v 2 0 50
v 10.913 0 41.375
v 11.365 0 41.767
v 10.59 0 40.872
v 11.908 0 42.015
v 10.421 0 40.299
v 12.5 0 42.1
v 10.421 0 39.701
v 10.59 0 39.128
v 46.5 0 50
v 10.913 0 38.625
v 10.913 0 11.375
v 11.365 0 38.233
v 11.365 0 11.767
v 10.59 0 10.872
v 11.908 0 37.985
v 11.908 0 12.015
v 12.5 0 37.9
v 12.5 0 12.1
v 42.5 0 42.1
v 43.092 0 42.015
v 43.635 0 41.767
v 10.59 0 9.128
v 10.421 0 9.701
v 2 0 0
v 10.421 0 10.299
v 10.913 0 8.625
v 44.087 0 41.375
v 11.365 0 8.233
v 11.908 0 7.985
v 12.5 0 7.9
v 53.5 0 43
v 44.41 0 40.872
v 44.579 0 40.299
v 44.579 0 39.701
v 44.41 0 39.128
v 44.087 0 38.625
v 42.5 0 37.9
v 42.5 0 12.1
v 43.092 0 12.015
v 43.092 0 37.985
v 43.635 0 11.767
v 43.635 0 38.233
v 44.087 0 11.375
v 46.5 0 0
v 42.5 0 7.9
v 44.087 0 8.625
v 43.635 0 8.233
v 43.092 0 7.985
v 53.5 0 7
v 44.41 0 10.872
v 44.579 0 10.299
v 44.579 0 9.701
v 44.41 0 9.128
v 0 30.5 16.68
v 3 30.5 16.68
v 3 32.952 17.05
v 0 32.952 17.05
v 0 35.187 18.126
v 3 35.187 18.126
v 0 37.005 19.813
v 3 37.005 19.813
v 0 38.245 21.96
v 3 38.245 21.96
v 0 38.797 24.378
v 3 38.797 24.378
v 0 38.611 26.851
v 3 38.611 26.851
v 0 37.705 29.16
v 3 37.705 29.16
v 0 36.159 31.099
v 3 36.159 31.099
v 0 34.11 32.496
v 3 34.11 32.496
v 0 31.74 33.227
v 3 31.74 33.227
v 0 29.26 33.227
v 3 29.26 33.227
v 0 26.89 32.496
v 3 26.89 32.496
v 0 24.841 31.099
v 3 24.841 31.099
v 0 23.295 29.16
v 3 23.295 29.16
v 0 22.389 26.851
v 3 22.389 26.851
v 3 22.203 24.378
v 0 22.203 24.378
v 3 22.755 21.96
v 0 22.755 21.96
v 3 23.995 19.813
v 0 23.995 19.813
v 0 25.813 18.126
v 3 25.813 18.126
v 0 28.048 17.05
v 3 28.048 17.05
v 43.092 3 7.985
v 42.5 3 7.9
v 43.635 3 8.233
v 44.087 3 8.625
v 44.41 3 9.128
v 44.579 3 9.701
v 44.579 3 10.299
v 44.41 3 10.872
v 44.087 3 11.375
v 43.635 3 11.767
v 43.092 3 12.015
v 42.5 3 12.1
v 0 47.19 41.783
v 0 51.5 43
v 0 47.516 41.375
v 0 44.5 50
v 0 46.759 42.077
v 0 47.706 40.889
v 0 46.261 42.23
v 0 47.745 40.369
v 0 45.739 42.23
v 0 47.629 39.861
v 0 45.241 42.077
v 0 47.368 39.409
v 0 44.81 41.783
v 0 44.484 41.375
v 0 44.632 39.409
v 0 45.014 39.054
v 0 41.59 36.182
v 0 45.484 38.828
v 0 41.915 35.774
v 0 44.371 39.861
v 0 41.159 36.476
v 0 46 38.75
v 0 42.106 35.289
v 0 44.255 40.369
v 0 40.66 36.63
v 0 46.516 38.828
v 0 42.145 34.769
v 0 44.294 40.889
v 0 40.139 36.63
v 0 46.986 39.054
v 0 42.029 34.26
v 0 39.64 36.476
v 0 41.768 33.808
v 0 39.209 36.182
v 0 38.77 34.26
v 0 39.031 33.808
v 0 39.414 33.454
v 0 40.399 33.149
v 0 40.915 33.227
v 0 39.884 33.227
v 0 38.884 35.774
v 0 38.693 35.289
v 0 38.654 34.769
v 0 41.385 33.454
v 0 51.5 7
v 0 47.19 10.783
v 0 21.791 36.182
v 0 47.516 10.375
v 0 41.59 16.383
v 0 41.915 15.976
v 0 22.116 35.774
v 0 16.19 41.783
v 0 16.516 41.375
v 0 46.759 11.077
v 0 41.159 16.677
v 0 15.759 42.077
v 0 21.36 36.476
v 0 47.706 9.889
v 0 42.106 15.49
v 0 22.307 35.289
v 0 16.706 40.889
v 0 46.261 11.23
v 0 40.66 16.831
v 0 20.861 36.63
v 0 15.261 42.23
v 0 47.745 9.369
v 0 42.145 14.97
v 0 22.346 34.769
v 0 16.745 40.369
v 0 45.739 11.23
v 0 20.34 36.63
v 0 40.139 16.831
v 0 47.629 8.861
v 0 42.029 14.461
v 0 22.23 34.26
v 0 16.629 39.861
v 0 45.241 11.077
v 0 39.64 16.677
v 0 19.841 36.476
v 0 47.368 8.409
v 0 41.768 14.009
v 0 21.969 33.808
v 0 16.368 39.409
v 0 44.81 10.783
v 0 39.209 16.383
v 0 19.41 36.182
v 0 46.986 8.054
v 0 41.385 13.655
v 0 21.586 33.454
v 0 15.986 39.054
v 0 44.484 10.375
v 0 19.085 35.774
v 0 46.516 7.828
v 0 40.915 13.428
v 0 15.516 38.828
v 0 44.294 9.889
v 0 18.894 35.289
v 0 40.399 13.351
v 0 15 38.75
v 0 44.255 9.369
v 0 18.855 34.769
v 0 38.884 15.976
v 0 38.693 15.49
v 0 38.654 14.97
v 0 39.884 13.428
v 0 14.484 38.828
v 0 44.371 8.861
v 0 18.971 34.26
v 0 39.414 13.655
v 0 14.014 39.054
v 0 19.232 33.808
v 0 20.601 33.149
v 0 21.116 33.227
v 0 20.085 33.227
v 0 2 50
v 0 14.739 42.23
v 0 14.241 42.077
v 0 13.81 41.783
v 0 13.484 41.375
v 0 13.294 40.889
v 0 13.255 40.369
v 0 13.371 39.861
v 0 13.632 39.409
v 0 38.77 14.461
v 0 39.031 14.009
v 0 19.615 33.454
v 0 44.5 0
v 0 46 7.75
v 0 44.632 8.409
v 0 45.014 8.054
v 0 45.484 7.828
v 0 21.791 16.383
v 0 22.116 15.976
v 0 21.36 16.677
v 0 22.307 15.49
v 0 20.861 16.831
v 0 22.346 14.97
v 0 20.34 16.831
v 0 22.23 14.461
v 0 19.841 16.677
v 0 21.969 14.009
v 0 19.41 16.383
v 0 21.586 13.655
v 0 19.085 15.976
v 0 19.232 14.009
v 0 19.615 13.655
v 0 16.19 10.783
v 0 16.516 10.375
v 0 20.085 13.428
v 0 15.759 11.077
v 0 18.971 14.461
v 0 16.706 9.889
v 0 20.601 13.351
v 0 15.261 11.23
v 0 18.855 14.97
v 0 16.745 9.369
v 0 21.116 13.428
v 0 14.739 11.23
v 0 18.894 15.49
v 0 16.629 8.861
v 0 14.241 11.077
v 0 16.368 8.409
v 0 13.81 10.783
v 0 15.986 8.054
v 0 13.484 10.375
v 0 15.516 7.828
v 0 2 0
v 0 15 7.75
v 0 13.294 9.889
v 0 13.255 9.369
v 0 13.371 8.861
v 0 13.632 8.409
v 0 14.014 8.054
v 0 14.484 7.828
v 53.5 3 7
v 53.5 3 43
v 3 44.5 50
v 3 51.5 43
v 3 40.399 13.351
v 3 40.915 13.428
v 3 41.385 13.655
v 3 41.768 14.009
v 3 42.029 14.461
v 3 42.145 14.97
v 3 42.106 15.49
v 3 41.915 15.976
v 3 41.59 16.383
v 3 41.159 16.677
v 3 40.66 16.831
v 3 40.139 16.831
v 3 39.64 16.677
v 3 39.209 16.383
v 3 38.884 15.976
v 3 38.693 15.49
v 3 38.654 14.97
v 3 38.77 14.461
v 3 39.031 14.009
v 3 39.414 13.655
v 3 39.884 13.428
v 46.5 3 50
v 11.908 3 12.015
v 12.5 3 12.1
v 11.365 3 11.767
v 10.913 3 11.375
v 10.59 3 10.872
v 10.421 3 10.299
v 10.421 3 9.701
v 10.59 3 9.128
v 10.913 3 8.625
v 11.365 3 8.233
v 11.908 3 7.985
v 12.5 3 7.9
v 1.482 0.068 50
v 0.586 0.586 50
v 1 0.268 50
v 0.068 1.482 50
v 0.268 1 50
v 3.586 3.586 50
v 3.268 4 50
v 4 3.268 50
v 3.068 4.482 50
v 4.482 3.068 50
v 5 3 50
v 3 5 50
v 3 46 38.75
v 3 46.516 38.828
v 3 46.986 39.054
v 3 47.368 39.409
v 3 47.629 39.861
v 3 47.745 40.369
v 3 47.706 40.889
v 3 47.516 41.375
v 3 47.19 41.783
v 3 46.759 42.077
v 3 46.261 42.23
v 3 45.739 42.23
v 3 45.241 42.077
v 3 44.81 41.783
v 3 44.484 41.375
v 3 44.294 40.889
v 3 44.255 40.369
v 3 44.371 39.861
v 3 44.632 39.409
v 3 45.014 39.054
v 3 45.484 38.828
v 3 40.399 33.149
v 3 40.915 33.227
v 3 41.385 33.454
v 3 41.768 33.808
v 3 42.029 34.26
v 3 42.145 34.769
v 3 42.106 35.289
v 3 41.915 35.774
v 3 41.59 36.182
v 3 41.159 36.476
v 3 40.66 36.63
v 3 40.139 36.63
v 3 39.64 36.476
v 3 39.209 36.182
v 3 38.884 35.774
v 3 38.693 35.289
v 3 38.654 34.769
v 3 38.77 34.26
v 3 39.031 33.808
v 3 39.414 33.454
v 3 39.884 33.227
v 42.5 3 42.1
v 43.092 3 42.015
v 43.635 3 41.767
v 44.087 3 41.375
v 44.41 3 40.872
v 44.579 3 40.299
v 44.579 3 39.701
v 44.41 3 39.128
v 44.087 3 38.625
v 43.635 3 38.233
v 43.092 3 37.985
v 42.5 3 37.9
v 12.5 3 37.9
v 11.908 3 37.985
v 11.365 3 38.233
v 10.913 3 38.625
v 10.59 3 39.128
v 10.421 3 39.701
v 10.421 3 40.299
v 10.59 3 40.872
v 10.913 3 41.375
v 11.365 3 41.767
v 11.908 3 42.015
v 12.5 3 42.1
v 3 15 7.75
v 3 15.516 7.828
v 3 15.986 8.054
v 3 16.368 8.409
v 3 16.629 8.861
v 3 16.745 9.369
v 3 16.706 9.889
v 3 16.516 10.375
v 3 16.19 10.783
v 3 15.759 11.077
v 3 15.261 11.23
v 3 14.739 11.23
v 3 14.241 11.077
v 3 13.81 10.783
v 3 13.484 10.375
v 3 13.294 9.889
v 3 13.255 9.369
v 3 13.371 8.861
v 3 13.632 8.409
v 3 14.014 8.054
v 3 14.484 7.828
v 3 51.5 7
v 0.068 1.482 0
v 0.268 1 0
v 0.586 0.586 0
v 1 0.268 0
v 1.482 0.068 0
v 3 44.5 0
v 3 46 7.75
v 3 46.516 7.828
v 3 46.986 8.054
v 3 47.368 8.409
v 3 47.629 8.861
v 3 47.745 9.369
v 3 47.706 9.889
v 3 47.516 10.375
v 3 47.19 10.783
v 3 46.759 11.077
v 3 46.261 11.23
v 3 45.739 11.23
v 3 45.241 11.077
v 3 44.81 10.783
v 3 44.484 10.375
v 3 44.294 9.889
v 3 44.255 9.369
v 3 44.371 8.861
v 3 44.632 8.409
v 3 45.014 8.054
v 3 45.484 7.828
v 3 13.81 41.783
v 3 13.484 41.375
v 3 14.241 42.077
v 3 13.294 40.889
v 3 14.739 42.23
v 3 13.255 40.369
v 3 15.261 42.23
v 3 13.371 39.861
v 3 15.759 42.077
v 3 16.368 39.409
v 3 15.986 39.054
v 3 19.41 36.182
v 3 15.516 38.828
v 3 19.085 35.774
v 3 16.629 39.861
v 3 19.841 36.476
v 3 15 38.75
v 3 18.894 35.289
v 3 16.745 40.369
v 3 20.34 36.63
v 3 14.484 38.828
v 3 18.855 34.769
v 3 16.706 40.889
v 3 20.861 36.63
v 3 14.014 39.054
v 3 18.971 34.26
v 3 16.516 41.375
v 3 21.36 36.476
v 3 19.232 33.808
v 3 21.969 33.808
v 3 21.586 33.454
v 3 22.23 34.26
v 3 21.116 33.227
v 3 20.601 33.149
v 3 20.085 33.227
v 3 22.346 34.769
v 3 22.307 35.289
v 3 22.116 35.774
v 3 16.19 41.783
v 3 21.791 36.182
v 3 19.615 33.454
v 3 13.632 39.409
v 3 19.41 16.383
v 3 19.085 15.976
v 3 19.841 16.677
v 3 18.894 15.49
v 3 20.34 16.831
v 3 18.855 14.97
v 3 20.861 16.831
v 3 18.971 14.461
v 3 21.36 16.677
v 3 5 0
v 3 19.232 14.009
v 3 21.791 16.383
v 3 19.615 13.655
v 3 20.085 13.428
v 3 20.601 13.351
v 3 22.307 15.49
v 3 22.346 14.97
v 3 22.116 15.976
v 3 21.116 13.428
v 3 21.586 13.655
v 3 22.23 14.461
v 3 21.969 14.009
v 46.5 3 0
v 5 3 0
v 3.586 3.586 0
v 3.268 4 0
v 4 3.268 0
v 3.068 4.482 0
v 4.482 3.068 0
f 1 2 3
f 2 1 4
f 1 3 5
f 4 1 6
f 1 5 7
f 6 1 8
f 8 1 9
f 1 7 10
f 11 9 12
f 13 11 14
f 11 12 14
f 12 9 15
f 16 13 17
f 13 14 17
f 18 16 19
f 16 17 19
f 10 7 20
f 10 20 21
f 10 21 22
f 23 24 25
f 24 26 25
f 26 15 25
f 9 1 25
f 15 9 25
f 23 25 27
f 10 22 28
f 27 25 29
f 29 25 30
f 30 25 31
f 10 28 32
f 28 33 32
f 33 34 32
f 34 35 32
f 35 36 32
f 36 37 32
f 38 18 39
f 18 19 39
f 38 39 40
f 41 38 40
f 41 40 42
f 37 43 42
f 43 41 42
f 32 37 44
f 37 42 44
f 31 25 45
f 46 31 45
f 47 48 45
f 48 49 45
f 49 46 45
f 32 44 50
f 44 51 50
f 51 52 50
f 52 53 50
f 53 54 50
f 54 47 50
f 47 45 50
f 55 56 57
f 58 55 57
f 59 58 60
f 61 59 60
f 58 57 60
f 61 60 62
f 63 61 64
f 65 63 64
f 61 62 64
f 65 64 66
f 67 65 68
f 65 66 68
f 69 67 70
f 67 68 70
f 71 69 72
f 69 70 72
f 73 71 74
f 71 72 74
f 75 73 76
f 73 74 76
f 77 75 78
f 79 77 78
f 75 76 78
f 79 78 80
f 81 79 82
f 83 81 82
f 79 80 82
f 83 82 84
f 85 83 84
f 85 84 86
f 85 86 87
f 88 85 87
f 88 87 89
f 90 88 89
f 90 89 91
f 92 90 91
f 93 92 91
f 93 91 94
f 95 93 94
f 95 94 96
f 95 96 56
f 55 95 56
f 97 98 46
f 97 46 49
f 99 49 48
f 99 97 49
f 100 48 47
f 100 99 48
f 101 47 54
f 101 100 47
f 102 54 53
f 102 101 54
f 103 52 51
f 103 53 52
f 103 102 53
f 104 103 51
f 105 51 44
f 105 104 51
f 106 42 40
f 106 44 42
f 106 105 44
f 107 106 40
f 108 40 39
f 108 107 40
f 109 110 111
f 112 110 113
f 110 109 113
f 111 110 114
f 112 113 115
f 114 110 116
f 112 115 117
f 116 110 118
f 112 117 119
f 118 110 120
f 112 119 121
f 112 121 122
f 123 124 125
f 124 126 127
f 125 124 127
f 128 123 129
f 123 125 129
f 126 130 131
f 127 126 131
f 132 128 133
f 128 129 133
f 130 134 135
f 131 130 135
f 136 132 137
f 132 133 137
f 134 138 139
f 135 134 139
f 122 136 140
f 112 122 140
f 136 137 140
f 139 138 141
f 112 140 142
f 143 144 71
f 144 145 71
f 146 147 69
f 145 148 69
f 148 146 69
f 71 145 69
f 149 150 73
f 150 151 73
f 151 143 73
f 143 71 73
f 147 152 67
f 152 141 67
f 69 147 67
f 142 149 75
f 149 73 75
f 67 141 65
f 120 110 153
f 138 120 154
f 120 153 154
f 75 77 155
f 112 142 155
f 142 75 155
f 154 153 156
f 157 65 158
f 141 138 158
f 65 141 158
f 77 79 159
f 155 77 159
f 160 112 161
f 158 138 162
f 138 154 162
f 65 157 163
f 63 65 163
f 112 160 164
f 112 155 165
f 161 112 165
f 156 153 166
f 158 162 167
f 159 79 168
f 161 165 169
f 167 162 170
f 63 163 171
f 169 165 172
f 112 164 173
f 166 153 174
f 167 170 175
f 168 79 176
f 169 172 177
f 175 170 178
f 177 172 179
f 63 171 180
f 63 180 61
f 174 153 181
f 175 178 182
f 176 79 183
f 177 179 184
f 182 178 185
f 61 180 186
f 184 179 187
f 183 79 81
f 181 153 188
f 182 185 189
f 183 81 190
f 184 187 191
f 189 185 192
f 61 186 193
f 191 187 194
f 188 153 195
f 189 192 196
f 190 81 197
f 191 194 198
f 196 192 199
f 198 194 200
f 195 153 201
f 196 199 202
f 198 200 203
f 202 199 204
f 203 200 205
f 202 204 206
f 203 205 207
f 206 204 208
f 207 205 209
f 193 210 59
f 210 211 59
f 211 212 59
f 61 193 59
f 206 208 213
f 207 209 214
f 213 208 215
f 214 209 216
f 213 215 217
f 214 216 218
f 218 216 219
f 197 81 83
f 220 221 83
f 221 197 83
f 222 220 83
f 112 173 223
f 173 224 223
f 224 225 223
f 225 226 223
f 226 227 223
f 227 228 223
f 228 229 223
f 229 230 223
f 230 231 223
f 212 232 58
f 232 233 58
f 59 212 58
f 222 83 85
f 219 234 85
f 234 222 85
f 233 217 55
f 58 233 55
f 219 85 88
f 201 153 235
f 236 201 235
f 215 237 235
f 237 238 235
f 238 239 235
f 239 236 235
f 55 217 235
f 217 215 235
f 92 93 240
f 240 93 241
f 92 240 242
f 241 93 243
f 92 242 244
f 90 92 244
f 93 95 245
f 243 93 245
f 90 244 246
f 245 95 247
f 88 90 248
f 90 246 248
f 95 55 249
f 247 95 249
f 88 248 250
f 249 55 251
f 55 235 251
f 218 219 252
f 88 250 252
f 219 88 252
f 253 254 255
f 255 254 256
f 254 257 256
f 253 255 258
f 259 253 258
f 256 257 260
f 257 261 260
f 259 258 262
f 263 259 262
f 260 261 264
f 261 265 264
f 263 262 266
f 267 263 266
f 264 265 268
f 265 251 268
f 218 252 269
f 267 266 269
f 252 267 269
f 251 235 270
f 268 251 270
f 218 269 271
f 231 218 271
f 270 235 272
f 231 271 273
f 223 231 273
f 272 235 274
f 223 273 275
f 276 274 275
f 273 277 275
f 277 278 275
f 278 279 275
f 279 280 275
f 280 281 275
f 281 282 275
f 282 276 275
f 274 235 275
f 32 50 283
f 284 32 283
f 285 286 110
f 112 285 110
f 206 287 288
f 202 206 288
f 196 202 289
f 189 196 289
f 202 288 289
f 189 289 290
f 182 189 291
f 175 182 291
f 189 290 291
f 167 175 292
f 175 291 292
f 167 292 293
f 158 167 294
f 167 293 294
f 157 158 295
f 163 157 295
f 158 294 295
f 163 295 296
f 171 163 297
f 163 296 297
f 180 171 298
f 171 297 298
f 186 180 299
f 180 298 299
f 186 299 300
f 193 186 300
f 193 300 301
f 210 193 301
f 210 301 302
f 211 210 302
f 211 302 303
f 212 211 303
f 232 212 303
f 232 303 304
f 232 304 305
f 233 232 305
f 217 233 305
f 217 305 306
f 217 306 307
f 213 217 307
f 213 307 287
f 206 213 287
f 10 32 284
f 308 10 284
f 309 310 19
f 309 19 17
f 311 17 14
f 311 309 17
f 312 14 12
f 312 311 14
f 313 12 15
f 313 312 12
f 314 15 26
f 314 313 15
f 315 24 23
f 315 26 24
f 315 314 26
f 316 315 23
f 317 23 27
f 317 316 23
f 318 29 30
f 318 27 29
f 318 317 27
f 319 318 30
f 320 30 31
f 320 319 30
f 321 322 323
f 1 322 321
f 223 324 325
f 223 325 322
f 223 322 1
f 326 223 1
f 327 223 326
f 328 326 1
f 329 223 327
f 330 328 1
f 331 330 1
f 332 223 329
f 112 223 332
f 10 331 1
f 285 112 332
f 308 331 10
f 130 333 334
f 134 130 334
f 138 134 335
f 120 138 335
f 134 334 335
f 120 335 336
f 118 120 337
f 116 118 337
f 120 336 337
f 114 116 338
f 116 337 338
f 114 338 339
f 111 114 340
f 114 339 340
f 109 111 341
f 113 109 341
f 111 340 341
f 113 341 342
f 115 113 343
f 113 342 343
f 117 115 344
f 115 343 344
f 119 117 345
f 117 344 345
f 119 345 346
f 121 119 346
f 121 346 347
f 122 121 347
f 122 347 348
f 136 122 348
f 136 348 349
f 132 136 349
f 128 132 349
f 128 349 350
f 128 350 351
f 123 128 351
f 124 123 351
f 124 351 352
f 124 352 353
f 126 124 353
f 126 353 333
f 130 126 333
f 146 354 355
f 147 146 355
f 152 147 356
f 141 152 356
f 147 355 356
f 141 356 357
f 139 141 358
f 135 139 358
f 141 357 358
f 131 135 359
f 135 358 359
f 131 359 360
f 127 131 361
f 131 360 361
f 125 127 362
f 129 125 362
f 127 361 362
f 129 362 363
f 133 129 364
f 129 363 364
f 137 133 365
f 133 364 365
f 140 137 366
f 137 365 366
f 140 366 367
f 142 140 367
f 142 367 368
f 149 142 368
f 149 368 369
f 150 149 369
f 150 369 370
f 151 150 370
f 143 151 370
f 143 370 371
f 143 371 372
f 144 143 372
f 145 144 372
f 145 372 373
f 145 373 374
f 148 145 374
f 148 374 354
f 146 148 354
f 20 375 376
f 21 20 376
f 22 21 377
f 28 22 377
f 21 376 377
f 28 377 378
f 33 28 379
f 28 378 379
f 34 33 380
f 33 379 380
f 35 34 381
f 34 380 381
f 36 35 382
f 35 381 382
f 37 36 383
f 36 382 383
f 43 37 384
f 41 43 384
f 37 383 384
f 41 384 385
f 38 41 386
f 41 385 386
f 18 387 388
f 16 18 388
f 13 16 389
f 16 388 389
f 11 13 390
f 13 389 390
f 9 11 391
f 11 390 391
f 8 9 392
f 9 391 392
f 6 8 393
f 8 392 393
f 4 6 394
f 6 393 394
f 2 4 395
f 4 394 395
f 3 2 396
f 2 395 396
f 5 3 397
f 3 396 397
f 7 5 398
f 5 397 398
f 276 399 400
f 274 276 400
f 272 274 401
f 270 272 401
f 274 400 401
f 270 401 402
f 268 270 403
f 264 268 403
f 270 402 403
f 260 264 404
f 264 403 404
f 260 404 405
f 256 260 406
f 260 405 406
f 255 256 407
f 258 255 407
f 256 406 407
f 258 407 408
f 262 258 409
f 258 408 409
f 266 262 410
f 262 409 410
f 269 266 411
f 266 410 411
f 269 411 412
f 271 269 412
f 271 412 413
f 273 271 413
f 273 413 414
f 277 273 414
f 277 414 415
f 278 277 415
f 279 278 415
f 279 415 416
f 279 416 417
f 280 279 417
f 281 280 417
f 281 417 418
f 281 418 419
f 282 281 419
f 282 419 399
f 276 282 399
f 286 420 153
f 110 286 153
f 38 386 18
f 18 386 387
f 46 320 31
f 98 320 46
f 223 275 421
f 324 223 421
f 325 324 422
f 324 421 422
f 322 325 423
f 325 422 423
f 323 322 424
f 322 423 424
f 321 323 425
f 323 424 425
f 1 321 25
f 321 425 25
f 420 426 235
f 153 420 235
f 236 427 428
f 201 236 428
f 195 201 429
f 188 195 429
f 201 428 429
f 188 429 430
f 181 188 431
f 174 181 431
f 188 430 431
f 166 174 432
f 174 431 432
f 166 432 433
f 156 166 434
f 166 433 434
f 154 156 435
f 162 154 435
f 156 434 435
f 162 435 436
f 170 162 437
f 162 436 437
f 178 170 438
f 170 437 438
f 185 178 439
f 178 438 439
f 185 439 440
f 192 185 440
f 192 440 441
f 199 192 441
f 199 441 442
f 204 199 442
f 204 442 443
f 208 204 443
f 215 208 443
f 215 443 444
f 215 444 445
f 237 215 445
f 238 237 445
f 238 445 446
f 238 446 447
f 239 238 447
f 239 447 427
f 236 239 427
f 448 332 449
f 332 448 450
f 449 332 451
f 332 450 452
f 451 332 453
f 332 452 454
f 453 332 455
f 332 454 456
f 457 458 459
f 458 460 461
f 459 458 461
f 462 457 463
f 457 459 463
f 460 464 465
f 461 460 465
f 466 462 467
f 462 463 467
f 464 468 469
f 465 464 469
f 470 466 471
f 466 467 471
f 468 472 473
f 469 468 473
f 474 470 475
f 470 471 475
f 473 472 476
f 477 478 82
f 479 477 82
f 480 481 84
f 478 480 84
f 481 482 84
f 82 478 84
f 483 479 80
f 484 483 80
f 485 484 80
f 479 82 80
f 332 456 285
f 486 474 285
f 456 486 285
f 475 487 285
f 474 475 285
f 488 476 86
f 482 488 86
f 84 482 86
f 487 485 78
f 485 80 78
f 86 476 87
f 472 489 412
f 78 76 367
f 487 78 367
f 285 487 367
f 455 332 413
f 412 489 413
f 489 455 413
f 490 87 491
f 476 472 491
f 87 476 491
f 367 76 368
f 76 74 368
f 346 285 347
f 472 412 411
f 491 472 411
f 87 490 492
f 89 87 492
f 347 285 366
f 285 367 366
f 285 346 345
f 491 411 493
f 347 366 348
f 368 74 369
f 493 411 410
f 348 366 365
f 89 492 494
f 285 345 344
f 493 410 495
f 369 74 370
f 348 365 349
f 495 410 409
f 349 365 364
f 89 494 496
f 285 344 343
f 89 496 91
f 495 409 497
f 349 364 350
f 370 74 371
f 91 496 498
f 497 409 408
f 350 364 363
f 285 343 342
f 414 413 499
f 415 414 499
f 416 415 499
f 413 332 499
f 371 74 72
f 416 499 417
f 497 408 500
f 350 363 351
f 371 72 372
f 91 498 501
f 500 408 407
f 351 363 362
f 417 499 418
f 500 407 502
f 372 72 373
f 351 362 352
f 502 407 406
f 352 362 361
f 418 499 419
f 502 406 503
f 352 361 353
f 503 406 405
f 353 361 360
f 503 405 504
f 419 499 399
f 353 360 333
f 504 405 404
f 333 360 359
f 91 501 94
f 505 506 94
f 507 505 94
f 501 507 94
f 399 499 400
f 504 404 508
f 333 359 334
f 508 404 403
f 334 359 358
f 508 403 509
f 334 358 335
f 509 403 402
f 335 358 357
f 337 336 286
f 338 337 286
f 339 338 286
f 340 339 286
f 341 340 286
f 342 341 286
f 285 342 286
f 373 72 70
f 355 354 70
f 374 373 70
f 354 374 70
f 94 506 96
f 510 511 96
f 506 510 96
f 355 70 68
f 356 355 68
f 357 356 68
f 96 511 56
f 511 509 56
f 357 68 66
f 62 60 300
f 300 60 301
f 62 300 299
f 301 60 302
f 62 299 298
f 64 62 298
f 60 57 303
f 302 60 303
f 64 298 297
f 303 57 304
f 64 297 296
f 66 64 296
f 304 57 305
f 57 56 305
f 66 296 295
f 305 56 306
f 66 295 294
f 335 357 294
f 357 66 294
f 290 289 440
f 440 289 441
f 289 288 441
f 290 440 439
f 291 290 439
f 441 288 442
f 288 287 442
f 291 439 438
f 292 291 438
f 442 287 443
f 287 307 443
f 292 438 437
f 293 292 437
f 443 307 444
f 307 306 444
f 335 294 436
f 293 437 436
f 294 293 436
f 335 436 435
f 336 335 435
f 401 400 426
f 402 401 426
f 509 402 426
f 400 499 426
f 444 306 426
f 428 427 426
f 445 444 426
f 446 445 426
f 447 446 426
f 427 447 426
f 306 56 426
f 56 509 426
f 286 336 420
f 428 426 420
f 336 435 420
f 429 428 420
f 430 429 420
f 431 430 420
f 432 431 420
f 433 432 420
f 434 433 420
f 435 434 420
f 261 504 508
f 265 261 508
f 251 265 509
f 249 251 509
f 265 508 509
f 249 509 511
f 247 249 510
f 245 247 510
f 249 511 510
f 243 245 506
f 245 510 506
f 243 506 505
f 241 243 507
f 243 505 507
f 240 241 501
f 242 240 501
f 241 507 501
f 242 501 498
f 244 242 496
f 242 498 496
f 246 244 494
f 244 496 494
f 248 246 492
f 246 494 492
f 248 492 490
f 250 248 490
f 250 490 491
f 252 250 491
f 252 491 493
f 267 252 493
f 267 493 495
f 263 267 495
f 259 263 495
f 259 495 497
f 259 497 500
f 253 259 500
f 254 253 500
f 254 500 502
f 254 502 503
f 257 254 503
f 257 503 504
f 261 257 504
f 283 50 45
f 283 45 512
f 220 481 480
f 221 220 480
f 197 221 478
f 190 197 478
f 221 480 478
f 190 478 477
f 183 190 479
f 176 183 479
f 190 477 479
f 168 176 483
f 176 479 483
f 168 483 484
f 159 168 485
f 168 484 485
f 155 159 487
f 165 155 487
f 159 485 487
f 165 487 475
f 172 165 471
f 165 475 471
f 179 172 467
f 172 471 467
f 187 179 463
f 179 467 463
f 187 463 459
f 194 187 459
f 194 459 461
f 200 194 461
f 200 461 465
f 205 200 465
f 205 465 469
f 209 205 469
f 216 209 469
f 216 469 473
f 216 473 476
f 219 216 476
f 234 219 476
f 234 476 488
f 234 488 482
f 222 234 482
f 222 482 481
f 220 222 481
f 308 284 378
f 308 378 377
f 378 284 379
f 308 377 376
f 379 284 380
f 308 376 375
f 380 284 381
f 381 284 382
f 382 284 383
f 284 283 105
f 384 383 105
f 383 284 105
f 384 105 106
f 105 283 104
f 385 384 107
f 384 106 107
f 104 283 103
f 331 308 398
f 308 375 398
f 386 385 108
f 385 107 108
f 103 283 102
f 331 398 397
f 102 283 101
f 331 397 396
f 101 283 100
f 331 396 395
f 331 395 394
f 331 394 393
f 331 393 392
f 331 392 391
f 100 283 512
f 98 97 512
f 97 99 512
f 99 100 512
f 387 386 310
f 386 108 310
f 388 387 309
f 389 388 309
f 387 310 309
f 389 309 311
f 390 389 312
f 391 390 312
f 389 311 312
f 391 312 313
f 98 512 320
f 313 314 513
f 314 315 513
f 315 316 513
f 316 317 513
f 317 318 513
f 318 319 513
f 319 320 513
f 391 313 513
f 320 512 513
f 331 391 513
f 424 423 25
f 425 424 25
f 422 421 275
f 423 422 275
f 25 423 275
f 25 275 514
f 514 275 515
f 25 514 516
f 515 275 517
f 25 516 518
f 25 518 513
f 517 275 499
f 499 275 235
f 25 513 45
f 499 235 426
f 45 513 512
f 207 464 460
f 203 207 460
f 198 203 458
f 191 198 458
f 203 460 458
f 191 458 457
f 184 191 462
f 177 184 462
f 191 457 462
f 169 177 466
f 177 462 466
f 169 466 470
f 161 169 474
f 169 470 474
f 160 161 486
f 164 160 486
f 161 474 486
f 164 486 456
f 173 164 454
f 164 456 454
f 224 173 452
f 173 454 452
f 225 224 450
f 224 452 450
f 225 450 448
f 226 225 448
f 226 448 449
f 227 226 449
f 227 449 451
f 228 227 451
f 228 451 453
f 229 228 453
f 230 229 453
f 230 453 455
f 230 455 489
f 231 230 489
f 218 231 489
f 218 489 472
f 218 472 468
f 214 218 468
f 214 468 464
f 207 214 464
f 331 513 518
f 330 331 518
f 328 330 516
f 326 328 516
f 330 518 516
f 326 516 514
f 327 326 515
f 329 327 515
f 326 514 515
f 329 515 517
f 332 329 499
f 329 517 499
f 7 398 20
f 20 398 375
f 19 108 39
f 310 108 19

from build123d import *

# Parameters (mm, degrees)
BOSS_EXTRUDE1_DEPTH = 50
SKETCH2_R           = 8.320074994
SKETCH2_R_2         = 1.75
CUT_EXTRUDE1_DEPTH  = 4
CHAMFER1_SIZE       = 7
CHAMFER2_SIZE       = 7
CUT_EXTRUDE2_DEPTH  = 50


with BuildPart() as part:
    # Sketch1 → Boss-Extrude1 (new body)
    with BuildSketch(Plane.XY):
        with BuildLine():
            Line((0, 51.5), (0, 2))
            ThreePointArc((0, 2), (0.585786438, 0.585786438), (2, 0))
            Line((2, 0), (53.5, 0))
            Line((53.5, 0), (53.5, 3))
            Line((53.5, 3), (5, 3))
            ThreePointArc((5, 3), (3.585786438, 3.585786438), (3, 5))
            Line((3, 5), (3, 51.5))
            Line((3, 51.5), (0, 51.5))
        make_face()
    extrude(amount=BOSS_EXTRUDE1_DEPTH)

    # Sketch2 → Cut-Extrude1 (cut, through all)
    with BuildSketch(Plane(origin=(3, 0, 0), x_dir=(0, 0, -1), z_dir=(1, 0, 0))):
        with Locations((-25, 30.5)):
            Circle(SKETCH2_R)
        with Locations((-34.899494937, 40.399494937)):
            Circle(SKETCH2_R_2)
        with Locations((-15.100505063, 40.399494937)):
            Circle(SKETCH2_R_2)
        with Locations((-15.100505063, 20.600505063)):
            Circle(SKETCH2_R_2)
        with Locations((-34.899494937, 20.600505063)):
            Circle(SKETCH2_R_2)
        with Locations((-40.5, 46)):
            Circle(SKETCH2_R_2)
        with Locations((-9.5, 46)):
            Circle(SKETCH2_R_2)
        with Locations((-40.5, 15)):
            Circle(SKETCH2_R_2)
        with Locations((-9.5, 15)):
            Circle(SKETCH2_R_2)
    extrude(amount=-CUT_EXTRUDE1_DEPTH, mode=Mode.SUBTRACT)

    # Chamfer1
    chamfer1_edges = [part.edges().sort_by_distance(p)[0] for p in [
        (1.5, 51.5, 0),
    ]]
    chamfer(chamfer1_edges, length=CHAMFER1_SIZE)

    # Chamfer2
    chamfer2_edges = [part.edges().sort_by_distance(p)[0] for p in [
        (53.5, 1.5, 50),
        (1.5, 51.5, 50),
        (53.5, 1.5, 0),
    ]]
    chamfer(chamfer2_edges, length=CHAMFER2_SIZE)

    # Sketch5 → Cut-Extrude2 (cut)
    with BuildSketch(Plane(origin=(0, 3, 0), x_dir=(1, 0, 0), z_dir=(0, 1, 0))):
        with BuildLine():
            Line((12.5, -7.9), (42.5, -7.9))
            ThreePointArc((42.5, -7.9), (44.6, -10), (42.5, -12.1))
            Line((42.5, -12.1), (12.5, -12.1))
            ThreePointArc((12.5, -12.1), (10.4, -10), (12.5, -7.9))
        make_face()
        with BuildLine():
            Line((12.5, -42.1), (42.5, -42.1))
            ThreePointArc((42.5, -42.1), (44.6, -40), (42.5, -37.9))
            Line((42.5, -37.9), (12.5, -37.9))
            ThreePointArc((12.5, -37.9), (10.4, -40), (12.5, -42.1))
        make_face()
    extrude(amount=-CUT_EXTRUDE2_DEPTH, mode=Mode.SUBTRACT)


solid = part.part
